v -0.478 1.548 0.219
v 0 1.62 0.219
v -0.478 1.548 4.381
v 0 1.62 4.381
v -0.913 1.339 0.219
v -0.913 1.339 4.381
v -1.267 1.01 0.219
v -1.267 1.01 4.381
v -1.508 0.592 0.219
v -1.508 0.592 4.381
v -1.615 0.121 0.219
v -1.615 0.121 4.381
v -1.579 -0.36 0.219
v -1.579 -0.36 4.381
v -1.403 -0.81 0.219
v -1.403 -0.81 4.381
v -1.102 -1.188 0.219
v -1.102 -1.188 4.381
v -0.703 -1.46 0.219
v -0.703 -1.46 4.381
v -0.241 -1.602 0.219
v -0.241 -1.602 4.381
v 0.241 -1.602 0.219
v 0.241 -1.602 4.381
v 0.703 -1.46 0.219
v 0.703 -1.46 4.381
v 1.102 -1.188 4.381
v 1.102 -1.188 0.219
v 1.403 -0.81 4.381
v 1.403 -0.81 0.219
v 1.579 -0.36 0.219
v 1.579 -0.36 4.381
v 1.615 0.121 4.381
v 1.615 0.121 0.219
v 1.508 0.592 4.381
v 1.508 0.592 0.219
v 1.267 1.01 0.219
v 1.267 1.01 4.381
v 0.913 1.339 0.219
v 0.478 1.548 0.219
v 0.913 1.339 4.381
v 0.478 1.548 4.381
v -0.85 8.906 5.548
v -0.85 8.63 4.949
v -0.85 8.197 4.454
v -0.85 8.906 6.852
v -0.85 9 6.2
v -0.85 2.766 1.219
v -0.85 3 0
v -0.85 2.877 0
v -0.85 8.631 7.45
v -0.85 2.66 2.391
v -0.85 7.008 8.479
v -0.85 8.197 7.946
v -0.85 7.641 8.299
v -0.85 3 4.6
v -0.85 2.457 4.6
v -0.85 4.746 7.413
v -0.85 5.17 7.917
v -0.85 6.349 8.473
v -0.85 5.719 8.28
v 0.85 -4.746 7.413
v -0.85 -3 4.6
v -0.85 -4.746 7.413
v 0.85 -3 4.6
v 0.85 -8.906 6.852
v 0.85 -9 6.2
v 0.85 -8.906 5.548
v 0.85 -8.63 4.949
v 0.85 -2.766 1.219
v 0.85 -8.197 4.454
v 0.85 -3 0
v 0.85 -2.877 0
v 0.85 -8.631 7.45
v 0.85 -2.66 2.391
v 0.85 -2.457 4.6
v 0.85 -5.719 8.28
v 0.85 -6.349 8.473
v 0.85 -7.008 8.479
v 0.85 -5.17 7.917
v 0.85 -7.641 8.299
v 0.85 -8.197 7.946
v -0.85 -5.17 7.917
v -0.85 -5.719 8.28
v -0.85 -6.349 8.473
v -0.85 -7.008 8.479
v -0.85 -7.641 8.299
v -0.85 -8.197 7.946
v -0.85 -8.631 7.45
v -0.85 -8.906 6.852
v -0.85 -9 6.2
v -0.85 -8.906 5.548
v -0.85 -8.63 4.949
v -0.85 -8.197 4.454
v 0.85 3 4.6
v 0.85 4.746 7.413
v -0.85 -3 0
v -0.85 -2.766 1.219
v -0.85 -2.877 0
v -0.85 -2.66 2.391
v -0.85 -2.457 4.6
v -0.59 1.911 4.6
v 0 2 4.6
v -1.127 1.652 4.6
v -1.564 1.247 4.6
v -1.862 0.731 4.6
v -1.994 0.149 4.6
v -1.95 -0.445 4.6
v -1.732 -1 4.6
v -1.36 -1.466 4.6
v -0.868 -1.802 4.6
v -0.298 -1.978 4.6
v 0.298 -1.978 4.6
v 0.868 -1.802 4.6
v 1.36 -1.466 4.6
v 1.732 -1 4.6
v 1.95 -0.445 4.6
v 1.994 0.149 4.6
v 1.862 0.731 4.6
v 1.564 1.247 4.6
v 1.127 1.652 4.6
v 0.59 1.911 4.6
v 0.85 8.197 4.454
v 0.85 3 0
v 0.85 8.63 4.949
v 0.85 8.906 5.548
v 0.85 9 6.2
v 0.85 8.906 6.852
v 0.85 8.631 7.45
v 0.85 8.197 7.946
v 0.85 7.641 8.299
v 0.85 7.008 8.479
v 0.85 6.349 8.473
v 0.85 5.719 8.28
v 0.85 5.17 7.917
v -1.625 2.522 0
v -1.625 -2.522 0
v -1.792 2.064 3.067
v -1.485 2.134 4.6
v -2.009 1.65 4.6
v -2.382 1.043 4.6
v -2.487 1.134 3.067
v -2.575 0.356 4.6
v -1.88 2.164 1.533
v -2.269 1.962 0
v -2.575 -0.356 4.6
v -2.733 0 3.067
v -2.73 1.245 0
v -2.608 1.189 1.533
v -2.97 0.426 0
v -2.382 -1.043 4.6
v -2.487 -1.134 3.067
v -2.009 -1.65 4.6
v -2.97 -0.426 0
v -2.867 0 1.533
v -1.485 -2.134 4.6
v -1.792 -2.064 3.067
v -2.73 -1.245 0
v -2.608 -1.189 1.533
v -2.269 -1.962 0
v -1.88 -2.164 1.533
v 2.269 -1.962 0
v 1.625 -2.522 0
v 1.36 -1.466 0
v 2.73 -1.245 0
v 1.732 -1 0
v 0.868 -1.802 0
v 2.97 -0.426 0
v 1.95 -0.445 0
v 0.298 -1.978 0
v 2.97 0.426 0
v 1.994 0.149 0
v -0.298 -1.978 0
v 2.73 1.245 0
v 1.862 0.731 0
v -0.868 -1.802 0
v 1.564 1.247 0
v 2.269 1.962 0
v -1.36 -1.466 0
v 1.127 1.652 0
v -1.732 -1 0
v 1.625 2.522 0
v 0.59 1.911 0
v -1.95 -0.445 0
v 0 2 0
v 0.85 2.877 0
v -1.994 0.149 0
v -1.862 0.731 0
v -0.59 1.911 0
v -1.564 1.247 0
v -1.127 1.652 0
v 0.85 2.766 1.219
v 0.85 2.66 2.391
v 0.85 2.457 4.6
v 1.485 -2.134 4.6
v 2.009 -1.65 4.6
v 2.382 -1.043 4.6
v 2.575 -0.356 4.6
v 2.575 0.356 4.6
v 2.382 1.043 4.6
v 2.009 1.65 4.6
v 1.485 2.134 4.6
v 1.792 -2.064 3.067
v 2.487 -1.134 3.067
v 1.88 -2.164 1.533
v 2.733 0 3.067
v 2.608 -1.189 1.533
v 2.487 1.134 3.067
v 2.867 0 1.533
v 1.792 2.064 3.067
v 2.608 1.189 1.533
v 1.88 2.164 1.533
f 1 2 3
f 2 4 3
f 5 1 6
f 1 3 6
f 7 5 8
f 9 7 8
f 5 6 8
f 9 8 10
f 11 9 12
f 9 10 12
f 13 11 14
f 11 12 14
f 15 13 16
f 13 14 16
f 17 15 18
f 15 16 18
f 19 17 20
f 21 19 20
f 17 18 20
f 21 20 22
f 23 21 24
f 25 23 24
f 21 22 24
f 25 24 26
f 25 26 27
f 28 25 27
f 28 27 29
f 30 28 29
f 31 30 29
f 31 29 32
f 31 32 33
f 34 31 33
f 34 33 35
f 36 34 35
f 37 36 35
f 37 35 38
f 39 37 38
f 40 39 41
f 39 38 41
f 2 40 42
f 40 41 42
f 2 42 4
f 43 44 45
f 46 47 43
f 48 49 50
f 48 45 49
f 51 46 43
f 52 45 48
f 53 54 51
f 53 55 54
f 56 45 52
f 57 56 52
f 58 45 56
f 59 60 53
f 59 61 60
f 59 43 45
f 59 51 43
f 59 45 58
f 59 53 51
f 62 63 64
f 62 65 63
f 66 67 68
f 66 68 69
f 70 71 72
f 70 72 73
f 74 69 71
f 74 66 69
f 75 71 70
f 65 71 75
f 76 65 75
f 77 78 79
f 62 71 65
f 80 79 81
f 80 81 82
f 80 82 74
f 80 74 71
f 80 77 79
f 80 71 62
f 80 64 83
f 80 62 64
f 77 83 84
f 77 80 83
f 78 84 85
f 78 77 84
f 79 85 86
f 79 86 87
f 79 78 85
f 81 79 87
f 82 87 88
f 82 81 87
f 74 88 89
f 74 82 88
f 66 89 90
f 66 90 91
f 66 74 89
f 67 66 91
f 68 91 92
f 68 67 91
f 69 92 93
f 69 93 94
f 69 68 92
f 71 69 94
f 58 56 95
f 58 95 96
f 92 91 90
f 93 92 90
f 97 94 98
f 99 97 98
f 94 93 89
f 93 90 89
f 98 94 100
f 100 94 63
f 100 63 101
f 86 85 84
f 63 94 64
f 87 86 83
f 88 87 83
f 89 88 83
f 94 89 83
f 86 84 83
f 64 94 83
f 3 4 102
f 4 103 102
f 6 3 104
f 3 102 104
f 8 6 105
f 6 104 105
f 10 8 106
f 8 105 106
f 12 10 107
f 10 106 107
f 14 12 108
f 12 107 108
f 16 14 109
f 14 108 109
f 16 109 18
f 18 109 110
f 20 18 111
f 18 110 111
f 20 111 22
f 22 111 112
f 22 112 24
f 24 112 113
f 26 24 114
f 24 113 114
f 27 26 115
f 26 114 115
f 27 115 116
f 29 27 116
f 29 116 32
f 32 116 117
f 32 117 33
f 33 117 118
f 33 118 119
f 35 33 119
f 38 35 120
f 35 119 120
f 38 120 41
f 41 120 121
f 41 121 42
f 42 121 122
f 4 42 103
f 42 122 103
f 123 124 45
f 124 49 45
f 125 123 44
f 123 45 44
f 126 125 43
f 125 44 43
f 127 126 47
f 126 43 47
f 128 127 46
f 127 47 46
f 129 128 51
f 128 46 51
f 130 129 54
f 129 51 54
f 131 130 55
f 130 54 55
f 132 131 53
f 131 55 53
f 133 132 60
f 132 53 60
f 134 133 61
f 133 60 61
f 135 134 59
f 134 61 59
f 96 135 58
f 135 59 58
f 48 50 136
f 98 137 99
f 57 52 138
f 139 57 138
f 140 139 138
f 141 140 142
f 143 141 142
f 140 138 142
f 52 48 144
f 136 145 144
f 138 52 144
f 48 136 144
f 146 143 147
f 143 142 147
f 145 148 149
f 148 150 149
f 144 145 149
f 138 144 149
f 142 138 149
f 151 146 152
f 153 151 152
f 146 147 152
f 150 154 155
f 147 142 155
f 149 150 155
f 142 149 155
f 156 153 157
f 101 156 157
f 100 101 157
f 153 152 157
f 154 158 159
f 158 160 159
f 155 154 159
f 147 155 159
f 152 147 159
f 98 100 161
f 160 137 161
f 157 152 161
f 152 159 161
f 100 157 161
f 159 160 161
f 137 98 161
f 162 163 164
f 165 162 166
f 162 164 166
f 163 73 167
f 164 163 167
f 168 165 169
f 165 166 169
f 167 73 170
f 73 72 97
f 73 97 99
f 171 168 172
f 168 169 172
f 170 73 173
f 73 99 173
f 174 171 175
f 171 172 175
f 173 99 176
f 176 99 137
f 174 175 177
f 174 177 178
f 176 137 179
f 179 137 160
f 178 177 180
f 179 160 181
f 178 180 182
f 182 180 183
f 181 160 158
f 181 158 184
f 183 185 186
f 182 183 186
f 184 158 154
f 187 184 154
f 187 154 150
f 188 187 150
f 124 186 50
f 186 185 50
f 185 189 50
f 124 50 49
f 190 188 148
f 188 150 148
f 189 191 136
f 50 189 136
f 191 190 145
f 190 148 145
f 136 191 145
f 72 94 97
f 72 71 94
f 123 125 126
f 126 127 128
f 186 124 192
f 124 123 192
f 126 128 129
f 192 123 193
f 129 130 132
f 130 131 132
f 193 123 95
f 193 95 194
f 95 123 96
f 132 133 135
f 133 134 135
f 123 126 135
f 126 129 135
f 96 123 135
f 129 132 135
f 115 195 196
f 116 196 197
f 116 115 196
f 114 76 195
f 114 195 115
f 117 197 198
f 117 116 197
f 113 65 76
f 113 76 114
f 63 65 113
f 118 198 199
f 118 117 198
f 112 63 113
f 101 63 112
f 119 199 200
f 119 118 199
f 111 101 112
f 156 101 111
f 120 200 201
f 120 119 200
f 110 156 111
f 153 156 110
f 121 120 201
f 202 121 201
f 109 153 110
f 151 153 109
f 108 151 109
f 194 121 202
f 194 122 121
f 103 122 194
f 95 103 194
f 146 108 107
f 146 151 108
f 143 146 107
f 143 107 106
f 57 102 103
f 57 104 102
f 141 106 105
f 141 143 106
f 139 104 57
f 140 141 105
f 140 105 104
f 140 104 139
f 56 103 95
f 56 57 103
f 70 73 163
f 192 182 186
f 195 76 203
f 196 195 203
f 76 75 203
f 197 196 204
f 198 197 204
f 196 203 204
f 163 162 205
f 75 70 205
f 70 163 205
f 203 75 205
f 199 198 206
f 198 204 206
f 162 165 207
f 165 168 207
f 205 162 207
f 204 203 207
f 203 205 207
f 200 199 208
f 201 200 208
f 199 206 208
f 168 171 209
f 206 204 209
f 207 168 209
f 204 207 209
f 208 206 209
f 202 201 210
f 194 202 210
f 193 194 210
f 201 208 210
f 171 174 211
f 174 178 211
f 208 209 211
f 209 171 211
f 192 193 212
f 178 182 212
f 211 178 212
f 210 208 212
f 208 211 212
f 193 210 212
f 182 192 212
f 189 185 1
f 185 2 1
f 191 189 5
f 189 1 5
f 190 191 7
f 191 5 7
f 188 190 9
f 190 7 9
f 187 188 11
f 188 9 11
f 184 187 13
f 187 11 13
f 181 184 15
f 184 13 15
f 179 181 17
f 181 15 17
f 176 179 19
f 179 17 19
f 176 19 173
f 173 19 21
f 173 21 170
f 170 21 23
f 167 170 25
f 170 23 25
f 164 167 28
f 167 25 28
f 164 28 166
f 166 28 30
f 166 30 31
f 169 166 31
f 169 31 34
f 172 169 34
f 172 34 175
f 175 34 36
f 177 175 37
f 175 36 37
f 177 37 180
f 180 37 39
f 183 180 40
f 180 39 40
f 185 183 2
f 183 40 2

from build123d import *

# Parameters (mm, degrees)
PAD_DEPTH = 0.85


with BuildPart() as pad:
    # Sketch001 → Pad (new body, symmetric)
    with BuildSketch(Plane.YZ):
        with BuildLine():
            Line((2, 0), (2, 4.6))
            Line((2, 4.6), (3, 4.6))
            Line((3, 4.6), (4.745783, 7.412863))
            ThreePointArc((8.196676, 4.453586), (8.197219, 7.945948), (4.745783, 7.412863))
            Line((3, 0), (8.196676, 4.453586))
            Line((2, 0), (3, 0))
        make_face()
        with BuildLine():
            Line((-8.196687, 4.453578), (-3.000004, 0))
            Line((-3.000004, 0), (-2.000004, 0))
            Line((-2.000004, 0), (-2.000004, 4.6))
            Line((-2.000004, 4.6), (-3.000004, 4.6))
            Line((-3.000004, 4.6), (-4.745792, 7.41286))
            ThreePointArc((-4.745792, 7.41286), (-8.19722, 7.945929), (-8.196687, 4.453578))
        make_face()
    extrude(amount=PAD_DEPTH, both=True)


with BuildPart() as fl_gelmutter_din_315_m4:
    # Sketch → Revolution (revolve)
    with BuildSketch(Plane.YZ):
        Polygon((2, 0), (1.62, 0.219393), (1.62, 4.380607), (2, 4.6), (2.6, 4.6), (3, 0), align=None)
    revolve(axis=Axis((0, 0, 0), (0, 0, 1)))

    # Fusion: union Pad
    add(pad.part)


solid = fl_gelmutter_din_315_m4.part
